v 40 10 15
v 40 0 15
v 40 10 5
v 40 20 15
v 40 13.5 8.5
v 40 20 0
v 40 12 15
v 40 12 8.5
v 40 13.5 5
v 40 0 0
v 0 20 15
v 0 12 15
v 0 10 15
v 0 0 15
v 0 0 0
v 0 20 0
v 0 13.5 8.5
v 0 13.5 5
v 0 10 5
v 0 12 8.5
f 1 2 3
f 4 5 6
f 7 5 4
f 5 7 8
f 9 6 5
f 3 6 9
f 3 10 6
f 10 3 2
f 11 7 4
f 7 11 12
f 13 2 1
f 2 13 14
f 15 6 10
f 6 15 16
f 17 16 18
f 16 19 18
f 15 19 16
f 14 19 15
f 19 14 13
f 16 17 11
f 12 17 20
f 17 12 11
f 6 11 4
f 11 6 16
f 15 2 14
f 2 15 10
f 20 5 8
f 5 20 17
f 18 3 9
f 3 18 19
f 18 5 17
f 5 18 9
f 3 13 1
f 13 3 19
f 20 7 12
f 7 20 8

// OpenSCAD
module peelBlock(){
    difference(){
    cube([40, 20, 15]);
    translate([0, 10, 5]) cube([40,3.5, 3.5]);
        translate([0, 10, 5]) cube([40,2, 23.5]);
    }
}

peelBlock();
